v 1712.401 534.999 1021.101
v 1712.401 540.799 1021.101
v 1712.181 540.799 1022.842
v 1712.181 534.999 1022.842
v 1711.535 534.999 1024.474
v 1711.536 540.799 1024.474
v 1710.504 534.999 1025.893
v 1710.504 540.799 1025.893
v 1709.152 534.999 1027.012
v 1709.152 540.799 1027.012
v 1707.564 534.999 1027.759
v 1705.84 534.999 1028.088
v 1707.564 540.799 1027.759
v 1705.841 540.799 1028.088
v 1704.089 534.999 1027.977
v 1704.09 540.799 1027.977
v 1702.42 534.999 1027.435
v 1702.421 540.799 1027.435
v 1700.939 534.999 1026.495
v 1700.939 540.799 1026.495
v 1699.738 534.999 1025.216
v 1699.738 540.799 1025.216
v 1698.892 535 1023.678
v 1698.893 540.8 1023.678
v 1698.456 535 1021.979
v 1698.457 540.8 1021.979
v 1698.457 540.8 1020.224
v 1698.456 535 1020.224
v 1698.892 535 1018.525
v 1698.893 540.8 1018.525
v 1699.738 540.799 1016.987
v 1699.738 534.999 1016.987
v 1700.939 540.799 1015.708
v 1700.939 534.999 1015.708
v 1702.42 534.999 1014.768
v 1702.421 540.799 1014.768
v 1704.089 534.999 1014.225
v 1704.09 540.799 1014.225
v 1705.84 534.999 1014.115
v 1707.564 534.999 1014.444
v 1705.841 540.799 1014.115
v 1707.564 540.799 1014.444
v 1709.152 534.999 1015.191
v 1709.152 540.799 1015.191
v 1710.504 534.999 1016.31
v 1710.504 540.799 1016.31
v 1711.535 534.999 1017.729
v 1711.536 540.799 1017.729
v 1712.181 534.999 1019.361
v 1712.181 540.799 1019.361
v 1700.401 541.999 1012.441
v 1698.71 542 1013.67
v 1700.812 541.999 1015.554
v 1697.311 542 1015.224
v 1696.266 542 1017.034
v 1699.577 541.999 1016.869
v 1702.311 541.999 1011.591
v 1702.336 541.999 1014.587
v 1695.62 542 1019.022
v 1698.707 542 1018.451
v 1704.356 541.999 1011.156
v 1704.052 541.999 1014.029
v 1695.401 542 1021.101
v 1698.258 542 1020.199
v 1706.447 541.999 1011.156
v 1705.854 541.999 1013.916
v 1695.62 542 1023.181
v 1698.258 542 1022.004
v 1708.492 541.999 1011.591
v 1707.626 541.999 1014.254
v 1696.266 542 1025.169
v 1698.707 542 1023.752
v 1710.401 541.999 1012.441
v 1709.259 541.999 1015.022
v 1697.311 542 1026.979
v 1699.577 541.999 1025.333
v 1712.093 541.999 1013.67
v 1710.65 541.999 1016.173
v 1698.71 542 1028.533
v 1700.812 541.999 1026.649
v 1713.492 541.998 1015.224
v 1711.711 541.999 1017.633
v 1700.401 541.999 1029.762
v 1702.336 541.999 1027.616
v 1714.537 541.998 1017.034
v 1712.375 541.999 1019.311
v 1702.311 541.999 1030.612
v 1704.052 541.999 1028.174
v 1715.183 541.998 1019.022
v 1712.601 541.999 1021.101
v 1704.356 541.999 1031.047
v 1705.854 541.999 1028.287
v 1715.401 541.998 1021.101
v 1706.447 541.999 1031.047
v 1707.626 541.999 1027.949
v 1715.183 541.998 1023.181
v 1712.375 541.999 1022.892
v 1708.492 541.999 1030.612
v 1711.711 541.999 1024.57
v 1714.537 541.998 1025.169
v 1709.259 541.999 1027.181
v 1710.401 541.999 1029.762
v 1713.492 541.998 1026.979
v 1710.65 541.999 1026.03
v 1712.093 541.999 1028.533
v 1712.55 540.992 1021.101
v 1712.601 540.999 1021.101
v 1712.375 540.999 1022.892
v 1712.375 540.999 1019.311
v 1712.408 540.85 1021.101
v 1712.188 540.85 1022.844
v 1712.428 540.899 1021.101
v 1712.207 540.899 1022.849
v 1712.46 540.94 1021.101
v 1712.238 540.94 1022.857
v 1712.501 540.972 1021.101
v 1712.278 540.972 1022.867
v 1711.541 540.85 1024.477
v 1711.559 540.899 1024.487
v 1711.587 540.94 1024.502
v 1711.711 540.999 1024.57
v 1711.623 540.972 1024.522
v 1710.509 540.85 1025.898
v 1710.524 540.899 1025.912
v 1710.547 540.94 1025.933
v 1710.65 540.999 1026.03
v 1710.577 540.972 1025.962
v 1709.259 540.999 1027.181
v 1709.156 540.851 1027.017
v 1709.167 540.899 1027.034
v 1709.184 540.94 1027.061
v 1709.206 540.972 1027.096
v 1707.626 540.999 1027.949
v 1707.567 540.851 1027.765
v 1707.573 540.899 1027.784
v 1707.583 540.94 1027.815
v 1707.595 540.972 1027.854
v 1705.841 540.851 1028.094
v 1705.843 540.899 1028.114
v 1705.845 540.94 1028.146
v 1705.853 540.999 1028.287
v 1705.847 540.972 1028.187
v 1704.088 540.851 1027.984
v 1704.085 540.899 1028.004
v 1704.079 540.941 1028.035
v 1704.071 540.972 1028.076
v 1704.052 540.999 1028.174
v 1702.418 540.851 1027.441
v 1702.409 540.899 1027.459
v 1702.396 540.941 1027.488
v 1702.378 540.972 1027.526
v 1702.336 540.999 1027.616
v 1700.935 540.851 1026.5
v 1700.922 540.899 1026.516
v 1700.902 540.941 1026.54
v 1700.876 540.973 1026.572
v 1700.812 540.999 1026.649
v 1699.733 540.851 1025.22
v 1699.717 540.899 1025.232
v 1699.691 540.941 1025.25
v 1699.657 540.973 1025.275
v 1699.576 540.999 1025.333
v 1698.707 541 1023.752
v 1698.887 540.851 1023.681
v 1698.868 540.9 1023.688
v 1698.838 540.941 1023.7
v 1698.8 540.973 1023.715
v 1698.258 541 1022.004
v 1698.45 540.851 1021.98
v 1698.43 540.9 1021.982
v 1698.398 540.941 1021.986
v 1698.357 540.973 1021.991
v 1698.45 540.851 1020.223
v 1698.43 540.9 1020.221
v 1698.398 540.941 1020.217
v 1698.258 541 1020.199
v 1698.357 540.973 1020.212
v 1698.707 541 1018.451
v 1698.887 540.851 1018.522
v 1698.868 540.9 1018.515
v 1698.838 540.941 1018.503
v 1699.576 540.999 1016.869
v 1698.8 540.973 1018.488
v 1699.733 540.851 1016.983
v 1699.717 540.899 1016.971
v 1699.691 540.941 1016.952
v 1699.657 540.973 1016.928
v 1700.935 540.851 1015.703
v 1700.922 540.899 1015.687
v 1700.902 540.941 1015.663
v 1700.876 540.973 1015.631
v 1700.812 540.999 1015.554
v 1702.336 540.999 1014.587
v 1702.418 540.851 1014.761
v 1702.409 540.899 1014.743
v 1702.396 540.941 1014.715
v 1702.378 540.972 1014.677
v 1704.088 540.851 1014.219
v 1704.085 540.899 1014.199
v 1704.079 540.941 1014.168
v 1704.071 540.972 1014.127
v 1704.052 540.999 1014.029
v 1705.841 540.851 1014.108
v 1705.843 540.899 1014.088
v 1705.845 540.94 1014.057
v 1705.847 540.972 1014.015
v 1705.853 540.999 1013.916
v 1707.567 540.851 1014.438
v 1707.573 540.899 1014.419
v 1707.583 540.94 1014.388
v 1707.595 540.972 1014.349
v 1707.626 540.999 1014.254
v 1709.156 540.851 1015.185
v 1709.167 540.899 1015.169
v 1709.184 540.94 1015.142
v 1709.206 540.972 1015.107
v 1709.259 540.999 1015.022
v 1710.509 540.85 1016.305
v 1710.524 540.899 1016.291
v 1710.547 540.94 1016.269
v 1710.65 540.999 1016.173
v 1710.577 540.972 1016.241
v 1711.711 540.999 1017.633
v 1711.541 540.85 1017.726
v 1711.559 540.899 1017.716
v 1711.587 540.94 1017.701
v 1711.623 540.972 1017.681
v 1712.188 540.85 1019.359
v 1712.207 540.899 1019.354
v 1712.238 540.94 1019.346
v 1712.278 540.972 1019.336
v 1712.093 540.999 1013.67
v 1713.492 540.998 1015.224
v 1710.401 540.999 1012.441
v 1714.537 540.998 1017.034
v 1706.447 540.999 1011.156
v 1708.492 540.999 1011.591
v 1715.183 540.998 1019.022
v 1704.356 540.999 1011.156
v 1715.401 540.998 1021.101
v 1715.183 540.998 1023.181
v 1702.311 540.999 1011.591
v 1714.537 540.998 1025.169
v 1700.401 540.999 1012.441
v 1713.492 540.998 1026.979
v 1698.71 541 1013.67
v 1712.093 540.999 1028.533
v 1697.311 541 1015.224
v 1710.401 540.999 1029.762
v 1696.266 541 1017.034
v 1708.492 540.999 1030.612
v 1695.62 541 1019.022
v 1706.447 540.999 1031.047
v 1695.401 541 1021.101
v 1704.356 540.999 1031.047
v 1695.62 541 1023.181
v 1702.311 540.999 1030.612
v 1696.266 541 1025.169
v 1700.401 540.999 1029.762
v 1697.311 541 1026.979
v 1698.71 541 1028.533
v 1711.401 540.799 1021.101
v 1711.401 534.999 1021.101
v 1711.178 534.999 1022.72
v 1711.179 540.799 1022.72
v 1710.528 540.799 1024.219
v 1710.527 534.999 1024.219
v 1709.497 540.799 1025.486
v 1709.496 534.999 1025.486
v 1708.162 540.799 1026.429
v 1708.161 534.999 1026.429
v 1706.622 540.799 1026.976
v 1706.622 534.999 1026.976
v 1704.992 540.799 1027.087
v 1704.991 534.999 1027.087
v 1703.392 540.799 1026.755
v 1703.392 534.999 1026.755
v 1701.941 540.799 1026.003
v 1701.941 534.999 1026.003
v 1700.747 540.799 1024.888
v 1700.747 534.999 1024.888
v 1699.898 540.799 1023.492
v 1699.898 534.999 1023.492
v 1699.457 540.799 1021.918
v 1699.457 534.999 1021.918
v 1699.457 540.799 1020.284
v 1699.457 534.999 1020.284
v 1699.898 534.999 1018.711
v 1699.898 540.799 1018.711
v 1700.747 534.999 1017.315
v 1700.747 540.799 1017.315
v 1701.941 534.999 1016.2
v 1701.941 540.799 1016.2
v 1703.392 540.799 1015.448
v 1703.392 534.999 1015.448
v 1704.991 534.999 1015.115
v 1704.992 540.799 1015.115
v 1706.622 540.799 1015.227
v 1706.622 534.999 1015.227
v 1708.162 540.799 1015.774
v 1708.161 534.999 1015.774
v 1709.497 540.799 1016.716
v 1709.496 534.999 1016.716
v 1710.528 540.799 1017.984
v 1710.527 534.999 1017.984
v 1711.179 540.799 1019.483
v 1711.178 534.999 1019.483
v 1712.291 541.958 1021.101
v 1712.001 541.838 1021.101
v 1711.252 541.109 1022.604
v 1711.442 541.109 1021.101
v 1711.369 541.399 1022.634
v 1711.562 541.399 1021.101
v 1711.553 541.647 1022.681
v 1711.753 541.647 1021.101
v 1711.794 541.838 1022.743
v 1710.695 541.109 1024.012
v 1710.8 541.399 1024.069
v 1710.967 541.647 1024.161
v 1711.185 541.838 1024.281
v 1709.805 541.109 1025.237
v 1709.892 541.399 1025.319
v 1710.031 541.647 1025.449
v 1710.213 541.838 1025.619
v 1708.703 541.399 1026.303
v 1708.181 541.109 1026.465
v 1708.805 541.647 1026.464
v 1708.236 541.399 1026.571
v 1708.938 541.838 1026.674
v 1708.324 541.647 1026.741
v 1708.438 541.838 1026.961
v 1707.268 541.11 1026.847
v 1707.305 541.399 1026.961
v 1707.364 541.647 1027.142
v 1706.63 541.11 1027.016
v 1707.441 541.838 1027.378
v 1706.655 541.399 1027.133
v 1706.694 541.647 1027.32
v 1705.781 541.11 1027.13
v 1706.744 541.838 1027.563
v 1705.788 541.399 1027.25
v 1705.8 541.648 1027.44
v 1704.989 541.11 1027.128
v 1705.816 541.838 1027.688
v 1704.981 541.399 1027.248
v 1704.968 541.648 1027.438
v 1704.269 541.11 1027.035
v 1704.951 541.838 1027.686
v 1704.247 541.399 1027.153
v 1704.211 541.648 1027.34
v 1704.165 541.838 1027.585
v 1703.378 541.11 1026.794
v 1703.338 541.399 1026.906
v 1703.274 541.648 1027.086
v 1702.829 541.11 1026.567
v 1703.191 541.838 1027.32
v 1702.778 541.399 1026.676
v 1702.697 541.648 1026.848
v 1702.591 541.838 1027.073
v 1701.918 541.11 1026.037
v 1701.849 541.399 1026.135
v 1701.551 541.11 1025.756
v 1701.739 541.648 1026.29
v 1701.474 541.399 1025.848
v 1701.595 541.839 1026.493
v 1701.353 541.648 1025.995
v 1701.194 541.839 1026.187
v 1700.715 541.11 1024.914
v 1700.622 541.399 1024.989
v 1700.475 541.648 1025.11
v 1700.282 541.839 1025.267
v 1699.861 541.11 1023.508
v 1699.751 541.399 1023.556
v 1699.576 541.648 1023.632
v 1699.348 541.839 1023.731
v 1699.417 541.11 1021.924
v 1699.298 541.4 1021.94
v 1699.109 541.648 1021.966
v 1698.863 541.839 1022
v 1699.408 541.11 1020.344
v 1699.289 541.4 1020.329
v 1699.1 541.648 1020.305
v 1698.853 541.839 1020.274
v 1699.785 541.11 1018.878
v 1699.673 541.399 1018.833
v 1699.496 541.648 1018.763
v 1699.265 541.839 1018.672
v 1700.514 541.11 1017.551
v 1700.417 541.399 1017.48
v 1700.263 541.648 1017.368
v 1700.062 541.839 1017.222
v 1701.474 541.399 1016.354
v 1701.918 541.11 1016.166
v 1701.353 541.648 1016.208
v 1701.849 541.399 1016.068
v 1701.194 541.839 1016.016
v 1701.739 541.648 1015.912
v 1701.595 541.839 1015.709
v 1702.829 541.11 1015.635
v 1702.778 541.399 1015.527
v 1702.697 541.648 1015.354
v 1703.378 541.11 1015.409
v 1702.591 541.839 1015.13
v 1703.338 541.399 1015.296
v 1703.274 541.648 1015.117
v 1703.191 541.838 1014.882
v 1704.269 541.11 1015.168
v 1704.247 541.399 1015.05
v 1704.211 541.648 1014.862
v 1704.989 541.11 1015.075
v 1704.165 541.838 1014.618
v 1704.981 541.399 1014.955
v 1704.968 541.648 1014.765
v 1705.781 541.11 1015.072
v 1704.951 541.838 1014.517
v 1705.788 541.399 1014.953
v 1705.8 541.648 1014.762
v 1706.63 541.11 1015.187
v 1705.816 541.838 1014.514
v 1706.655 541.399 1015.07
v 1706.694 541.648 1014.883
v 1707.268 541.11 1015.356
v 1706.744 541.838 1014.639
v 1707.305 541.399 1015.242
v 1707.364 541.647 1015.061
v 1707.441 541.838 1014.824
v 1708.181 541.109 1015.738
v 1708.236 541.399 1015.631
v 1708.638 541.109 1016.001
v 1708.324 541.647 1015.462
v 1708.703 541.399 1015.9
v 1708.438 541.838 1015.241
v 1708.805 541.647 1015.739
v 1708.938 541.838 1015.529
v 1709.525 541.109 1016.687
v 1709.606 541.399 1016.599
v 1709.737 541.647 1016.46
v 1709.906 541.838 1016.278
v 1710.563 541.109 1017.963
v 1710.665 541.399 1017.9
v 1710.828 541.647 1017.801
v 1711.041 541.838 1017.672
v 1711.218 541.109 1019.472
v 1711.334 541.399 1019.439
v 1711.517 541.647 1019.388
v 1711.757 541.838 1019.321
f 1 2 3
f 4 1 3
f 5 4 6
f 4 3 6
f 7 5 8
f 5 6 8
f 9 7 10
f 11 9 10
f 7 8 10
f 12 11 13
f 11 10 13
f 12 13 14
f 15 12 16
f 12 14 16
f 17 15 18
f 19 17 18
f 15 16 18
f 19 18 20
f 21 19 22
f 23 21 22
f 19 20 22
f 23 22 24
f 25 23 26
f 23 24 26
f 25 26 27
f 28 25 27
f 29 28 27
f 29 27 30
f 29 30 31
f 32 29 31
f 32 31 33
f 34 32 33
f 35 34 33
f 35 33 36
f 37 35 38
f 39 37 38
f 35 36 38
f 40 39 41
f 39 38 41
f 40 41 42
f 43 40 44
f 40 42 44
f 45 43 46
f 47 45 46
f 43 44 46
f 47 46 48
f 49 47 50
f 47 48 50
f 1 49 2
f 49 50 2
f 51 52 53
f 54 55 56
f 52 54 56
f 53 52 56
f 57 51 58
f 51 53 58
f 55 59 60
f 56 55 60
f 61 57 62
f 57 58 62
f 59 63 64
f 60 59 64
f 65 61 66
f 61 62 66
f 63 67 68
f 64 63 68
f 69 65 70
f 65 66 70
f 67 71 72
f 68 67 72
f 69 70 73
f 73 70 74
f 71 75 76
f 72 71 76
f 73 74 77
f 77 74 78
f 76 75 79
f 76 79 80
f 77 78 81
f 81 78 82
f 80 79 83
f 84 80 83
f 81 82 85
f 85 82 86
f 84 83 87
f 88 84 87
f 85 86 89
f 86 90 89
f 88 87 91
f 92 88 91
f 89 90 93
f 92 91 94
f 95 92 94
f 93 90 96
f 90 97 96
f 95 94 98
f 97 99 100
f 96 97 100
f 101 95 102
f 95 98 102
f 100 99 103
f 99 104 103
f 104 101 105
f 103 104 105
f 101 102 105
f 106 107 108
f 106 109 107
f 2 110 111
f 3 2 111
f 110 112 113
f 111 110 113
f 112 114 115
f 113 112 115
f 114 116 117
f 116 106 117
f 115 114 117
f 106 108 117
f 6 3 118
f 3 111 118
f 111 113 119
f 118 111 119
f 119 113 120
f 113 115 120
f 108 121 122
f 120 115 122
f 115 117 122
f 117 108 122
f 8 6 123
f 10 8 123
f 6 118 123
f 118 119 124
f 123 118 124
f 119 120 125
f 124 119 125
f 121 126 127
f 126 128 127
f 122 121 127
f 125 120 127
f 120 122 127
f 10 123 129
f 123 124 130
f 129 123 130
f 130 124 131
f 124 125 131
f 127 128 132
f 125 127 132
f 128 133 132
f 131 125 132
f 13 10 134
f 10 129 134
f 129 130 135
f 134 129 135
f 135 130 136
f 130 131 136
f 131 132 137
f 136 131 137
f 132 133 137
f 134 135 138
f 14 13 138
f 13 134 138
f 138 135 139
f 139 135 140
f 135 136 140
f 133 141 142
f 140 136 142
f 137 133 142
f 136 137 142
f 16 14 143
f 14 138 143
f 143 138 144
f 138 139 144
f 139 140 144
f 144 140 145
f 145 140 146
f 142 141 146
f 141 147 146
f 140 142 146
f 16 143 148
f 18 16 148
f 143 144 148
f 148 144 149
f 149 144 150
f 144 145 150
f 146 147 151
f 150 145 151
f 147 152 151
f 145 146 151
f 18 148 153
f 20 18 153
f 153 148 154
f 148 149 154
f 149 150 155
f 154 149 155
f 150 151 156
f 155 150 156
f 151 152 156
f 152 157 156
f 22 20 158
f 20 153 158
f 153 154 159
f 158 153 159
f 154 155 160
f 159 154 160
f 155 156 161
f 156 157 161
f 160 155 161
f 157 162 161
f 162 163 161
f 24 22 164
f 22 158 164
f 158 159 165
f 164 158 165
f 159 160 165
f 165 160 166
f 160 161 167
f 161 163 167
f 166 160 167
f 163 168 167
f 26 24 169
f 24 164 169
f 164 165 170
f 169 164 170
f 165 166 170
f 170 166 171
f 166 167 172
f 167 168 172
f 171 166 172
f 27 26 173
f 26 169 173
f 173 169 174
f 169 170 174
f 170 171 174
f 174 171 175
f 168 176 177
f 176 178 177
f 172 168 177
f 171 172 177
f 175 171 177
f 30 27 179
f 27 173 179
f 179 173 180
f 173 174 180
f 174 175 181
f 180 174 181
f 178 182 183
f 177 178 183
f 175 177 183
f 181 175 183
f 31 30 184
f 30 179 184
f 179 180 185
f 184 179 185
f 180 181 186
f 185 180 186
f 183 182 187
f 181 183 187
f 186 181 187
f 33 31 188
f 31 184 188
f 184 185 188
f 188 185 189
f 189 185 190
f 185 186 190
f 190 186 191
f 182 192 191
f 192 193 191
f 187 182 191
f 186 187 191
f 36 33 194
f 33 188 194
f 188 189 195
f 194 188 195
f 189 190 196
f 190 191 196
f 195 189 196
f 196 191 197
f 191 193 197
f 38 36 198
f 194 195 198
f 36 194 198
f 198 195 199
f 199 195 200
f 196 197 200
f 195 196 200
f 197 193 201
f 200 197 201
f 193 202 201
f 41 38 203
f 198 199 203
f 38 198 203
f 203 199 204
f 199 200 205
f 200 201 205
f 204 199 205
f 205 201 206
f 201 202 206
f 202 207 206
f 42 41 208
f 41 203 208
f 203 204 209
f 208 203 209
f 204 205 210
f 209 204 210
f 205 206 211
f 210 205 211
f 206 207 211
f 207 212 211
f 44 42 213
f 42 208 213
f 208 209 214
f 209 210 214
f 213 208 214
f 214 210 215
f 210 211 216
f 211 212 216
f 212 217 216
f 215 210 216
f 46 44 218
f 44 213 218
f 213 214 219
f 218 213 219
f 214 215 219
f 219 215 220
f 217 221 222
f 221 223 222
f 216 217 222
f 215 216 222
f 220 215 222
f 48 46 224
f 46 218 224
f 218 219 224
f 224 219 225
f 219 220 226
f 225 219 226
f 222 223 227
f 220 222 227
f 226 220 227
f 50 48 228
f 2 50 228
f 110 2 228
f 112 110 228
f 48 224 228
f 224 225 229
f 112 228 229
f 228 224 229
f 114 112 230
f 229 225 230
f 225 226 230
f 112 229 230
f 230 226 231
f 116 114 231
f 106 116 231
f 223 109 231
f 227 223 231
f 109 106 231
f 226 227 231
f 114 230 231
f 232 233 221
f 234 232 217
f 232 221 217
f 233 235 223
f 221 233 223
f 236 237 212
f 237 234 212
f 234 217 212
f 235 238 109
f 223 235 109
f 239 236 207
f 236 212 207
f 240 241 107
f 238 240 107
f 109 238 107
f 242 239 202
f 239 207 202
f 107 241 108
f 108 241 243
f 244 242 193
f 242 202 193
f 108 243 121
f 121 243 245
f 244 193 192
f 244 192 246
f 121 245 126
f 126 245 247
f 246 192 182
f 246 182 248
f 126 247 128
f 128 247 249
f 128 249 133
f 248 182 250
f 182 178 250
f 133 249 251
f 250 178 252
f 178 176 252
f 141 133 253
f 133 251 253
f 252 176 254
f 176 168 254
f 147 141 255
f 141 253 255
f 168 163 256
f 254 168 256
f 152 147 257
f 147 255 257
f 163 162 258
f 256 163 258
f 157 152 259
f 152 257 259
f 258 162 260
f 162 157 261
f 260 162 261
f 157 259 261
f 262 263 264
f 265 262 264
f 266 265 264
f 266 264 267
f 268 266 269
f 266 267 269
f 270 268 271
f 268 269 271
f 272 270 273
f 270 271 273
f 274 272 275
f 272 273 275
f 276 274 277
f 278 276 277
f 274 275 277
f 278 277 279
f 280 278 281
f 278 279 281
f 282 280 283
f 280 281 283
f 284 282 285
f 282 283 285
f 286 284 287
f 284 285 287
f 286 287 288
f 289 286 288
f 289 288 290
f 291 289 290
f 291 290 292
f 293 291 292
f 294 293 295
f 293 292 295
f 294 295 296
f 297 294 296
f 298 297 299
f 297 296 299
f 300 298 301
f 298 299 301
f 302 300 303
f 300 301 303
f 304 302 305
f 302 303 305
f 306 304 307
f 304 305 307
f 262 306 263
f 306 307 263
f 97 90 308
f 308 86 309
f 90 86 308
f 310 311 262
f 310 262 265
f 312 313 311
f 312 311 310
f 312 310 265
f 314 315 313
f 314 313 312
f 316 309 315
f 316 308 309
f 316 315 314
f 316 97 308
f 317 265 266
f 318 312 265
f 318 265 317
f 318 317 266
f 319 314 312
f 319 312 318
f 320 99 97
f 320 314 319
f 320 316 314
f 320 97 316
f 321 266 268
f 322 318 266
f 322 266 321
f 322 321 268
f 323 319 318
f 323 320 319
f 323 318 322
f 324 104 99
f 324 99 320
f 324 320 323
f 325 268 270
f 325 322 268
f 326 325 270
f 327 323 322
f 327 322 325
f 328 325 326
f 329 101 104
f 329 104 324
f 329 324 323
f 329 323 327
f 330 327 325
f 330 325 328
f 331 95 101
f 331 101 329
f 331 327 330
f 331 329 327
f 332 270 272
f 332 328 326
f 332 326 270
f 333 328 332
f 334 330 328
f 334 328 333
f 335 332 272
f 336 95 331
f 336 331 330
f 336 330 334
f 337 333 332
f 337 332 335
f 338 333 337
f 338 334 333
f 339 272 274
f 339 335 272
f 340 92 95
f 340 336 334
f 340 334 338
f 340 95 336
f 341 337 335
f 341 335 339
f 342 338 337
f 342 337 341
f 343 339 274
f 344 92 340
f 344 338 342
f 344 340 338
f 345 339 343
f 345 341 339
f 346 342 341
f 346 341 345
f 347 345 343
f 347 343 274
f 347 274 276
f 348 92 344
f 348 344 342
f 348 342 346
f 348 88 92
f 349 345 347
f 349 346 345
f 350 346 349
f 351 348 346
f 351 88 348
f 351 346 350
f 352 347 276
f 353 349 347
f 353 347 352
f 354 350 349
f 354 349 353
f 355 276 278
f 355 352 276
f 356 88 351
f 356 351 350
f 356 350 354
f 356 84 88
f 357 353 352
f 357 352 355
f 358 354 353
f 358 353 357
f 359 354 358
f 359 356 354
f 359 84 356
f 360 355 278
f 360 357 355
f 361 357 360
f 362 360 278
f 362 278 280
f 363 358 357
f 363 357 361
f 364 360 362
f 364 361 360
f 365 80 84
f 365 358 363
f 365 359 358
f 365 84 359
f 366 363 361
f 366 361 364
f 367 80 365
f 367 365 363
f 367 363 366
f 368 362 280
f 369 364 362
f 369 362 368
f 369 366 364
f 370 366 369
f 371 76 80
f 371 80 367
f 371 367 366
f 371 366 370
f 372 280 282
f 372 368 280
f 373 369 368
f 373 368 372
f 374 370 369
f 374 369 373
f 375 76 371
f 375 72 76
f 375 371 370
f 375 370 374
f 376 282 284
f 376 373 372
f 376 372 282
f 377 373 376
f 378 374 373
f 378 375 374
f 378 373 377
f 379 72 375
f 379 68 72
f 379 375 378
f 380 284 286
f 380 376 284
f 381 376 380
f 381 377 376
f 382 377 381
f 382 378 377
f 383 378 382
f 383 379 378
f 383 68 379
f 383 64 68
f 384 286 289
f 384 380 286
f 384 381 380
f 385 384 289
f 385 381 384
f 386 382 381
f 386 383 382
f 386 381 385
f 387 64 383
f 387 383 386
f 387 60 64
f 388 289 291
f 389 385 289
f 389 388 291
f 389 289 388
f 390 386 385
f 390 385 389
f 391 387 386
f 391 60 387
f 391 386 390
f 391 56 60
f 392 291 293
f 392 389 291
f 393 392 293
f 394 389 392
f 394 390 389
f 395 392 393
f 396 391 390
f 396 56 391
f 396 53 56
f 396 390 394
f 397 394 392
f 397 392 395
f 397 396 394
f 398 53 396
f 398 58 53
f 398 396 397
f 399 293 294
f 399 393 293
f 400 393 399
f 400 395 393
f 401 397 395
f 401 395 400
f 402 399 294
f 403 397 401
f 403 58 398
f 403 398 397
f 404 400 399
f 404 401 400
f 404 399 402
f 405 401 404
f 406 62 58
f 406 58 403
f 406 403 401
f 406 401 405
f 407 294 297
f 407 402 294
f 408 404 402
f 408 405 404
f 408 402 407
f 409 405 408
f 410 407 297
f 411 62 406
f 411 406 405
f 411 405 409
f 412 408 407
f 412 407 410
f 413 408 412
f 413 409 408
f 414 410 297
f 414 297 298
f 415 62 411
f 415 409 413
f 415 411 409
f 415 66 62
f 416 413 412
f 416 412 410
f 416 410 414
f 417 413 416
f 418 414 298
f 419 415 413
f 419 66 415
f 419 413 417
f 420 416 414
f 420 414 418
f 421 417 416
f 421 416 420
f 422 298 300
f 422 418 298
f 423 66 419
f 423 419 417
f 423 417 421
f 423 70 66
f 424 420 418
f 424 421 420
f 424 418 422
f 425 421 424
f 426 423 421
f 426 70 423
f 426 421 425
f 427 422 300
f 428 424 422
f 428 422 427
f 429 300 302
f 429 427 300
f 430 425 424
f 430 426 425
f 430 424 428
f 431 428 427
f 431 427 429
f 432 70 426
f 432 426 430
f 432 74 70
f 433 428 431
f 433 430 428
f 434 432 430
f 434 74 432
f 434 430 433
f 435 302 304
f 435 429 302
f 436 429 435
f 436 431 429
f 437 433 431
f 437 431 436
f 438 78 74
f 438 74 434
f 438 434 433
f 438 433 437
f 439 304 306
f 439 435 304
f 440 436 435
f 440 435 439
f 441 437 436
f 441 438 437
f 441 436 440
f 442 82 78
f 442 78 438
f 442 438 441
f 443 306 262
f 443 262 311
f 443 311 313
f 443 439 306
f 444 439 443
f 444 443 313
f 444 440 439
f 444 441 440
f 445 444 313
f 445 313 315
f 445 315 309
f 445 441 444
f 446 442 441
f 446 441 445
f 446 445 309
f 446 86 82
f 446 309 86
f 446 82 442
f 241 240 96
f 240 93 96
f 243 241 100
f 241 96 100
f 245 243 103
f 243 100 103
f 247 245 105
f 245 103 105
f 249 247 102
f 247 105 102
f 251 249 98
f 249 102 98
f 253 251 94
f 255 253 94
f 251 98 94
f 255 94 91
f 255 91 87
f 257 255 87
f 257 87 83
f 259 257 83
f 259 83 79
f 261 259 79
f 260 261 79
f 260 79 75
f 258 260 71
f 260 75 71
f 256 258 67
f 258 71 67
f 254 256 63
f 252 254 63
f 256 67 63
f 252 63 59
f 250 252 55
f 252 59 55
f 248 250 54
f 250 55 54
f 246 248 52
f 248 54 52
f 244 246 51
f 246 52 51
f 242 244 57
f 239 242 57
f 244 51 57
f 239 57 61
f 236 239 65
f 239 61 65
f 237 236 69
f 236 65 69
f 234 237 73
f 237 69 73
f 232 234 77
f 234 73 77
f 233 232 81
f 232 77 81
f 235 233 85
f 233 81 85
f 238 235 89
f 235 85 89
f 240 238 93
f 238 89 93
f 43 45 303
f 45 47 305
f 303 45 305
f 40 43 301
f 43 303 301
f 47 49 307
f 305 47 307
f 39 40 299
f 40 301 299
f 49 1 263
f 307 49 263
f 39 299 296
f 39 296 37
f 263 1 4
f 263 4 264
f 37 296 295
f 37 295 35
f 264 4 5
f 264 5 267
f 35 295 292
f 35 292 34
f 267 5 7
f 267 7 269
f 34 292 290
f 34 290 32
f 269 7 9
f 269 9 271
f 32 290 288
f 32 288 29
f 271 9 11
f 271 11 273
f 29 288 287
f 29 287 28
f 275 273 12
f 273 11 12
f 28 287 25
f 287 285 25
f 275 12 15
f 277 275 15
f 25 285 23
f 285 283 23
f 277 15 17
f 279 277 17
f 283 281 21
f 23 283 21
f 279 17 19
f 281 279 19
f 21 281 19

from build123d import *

# Parameters (mm, degrees)
CONG_0_2_R = 0.2
CONG_1_2_R = 1.2


with BuildPart() as part:
    # Esquisse1 → Base-Révolution (revolve)
    with BuildSketch(Plane(origin=(0, -0.000542726, 1021.101133201), x_dir=(1, 0, 0), z_dir=(0, -5.315106892389565e-07, 0.9999999999998588))):
        Polygon((1715.401443519, 541.998878787), (1711.40144353, 541.999169346), (1711.400935051, 534.999169365), (1712.400935049, 534.999096725), (1712.401370888, 540.999096709), (1715.40137088, 540.99887879), align=None)
    revolve(axis=Axis((1705.401443602, 541.999832964, 1021.10142128), (-7.263980373159368e-05, -0.9999999973615882, -5.315107006836232e-07)))

    # Congé0.2
    cong_0_2_edges = [part.edges().sort_by_distance(p)[0] for p in [
        (1698.401370924, 540.99957094, 1021.101420749),
    ]]
    fillet(cong_0_2_edges, radius=CONG_0_2_R)

    # Congé1.2
    cong_1_2_edges = [part.edges().sort_by_distance(p)[0] for p in [
        (1699.401443562, 541.999498298, 1021.10142128),
    ]]
    fillet(cong_1_2_edges, radius=CONG_1_2_R)


solid = part.part
